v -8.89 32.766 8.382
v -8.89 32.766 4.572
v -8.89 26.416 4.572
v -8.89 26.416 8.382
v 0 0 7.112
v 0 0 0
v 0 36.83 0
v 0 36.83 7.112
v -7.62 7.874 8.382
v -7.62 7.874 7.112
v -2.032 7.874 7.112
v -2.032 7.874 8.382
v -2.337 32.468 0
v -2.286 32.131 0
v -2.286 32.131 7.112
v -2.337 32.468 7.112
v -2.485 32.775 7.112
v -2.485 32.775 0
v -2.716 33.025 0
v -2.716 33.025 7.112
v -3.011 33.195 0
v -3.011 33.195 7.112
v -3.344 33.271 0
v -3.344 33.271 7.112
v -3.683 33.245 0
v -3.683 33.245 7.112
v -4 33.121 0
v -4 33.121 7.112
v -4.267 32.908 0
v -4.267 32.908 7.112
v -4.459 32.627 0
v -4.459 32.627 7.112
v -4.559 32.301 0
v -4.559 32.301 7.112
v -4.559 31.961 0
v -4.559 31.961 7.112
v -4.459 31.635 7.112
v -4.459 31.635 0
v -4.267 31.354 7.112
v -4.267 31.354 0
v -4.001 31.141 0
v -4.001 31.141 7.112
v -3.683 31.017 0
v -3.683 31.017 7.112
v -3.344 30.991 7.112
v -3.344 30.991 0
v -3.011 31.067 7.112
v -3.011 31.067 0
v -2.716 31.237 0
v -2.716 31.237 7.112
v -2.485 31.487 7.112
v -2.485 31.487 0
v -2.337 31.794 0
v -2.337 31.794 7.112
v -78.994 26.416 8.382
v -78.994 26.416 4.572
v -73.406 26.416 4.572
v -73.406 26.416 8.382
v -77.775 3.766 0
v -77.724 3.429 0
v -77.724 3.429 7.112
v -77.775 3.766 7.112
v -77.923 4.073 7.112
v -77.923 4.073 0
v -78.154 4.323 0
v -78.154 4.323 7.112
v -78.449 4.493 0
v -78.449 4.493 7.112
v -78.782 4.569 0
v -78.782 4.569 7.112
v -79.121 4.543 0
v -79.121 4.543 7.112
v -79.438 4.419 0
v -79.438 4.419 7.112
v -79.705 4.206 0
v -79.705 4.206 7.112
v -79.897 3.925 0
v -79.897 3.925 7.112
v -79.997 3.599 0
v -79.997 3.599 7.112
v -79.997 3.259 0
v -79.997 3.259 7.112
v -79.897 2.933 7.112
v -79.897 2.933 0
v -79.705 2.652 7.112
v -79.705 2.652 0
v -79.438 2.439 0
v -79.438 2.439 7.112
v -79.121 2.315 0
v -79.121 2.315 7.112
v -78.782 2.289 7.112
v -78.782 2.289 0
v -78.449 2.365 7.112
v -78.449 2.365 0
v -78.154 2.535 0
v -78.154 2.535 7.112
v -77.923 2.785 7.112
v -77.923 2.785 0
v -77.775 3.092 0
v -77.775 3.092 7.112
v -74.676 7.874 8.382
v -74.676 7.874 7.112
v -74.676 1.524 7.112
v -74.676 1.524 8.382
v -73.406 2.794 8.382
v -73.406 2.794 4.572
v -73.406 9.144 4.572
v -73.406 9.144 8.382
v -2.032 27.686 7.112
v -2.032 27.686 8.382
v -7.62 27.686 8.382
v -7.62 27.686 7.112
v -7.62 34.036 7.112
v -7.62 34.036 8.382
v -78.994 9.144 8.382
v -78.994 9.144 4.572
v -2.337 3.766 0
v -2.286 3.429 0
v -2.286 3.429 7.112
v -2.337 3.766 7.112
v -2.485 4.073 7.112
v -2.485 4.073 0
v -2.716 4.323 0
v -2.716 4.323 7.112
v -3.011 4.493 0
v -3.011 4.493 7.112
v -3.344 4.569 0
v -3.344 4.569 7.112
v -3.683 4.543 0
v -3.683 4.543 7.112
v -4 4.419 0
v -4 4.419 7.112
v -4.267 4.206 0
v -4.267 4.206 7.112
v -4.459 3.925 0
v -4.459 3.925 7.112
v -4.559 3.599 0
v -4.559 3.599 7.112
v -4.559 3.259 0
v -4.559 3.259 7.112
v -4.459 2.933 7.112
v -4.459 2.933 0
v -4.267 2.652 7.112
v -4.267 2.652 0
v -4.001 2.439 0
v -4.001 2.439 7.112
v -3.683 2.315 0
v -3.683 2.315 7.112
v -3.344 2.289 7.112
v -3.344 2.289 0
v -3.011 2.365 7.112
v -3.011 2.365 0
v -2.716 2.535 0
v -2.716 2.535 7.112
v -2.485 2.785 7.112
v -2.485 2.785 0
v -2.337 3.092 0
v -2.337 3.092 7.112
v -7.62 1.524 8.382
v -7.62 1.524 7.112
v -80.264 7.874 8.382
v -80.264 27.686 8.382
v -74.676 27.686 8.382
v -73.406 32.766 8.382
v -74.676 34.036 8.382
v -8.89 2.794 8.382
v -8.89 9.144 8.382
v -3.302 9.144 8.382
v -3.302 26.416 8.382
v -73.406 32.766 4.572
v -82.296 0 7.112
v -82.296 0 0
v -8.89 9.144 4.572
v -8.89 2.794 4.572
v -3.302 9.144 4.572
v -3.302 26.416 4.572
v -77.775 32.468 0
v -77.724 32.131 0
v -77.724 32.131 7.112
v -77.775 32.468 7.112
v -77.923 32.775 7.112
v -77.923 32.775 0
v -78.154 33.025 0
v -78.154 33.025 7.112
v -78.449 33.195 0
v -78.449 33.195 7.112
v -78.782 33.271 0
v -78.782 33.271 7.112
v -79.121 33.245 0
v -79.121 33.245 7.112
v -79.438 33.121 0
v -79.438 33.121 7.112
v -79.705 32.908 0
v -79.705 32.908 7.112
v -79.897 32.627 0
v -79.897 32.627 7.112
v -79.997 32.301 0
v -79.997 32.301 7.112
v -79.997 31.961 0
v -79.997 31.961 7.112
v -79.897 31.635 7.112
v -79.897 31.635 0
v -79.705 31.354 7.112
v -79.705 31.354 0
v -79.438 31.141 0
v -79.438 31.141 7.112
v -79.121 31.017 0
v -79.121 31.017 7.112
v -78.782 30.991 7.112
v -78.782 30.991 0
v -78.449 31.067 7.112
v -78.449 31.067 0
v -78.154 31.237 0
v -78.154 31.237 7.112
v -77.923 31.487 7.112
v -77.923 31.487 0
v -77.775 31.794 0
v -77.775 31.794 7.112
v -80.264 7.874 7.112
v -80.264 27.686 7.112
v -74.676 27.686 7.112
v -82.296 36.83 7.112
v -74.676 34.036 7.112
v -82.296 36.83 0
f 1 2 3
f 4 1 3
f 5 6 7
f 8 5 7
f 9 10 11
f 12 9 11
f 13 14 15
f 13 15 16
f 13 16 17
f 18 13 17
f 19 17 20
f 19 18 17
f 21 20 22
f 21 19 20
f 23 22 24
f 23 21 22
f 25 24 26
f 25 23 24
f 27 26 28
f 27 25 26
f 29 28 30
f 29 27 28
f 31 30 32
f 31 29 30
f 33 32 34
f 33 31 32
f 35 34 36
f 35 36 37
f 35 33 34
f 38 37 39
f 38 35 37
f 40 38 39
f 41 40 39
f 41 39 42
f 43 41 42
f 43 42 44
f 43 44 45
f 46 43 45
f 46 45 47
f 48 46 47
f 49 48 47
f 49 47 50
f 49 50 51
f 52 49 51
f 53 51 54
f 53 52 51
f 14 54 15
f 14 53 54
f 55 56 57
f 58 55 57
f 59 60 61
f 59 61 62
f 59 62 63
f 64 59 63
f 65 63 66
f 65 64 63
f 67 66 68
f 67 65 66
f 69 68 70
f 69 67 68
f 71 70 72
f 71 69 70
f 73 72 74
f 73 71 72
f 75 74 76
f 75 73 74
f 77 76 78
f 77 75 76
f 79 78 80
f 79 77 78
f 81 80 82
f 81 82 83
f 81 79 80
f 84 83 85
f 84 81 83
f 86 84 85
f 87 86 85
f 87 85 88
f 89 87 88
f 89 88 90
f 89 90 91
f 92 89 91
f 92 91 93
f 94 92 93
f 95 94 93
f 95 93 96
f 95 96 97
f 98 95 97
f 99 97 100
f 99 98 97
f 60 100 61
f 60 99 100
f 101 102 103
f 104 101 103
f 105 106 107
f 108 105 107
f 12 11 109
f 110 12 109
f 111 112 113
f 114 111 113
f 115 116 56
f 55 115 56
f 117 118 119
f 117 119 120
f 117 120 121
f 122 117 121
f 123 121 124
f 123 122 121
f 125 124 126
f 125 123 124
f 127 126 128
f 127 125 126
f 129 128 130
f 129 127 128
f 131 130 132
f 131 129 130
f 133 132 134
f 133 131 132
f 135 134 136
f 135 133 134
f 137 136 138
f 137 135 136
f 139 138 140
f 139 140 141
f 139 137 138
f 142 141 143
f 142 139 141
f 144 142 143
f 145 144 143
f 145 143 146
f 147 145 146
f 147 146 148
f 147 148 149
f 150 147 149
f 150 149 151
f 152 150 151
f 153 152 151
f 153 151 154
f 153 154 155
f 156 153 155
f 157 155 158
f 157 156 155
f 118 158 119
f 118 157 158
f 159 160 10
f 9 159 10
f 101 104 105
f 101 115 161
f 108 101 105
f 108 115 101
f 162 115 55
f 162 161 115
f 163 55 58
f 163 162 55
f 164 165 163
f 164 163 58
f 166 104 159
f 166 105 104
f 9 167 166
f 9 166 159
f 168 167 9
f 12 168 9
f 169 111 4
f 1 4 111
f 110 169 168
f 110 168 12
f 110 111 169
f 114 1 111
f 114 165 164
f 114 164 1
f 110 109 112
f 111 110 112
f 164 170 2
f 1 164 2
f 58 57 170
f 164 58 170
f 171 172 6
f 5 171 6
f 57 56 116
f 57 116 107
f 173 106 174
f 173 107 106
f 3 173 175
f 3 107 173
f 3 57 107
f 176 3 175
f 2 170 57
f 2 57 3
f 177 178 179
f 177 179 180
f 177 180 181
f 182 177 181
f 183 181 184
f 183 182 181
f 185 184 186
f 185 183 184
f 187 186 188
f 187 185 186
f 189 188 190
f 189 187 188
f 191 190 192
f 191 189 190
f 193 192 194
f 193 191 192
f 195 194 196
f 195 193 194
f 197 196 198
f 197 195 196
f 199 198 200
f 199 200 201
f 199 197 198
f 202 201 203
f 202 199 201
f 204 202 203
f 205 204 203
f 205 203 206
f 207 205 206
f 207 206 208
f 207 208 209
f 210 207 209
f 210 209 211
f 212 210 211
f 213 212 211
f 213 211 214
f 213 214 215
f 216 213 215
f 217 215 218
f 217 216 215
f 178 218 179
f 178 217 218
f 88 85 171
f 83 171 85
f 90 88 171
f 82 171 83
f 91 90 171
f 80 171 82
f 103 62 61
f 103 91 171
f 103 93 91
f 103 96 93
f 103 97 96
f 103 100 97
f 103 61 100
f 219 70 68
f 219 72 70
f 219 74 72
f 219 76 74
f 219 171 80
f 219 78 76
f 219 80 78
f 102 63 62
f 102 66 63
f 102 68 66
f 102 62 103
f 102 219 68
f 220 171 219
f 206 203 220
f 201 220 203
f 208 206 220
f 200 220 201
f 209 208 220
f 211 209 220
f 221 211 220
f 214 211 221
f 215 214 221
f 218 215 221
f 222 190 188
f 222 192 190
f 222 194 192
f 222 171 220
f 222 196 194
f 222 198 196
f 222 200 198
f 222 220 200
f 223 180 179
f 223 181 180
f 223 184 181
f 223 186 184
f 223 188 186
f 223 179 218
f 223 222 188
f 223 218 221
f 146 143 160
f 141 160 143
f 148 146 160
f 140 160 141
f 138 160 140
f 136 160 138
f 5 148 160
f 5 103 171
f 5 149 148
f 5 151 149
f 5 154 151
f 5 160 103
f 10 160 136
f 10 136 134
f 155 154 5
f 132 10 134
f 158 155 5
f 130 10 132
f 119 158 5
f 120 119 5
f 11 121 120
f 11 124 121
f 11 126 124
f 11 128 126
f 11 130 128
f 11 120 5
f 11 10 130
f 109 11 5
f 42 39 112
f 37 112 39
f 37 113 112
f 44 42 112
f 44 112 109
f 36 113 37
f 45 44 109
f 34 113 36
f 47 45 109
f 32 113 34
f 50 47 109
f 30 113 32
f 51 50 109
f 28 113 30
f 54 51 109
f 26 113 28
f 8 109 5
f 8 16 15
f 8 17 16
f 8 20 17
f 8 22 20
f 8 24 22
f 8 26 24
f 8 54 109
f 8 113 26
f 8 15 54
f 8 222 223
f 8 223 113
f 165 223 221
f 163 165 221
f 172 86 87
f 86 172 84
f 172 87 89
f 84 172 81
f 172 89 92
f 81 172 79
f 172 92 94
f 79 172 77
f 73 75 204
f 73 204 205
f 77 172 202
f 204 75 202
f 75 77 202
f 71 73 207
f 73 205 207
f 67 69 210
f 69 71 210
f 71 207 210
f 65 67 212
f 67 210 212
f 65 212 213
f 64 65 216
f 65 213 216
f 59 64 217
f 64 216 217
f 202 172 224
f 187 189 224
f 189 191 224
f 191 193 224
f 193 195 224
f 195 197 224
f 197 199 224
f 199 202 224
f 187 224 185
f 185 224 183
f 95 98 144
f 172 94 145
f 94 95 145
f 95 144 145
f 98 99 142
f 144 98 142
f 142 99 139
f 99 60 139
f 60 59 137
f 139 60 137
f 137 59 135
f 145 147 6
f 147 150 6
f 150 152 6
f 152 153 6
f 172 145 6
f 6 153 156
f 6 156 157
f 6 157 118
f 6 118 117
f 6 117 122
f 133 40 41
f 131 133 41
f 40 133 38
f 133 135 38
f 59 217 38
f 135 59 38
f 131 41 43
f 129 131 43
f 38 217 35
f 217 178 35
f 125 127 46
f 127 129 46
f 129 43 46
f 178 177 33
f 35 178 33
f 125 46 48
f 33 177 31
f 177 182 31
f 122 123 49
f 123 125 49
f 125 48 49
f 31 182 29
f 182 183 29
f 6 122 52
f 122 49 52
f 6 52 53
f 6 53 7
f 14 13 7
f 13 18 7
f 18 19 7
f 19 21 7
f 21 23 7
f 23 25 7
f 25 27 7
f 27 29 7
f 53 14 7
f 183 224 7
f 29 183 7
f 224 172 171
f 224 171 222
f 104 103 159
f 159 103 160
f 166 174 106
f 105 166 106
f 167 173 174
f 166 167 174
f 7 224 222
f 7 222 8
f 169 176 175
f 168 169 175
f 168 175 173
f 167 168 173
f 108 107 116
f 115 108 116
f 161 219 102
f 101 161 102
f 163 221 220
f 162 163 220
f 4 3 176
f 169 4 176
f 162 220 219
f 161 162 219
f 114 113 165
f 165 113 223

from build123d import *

# Parameters (mm, degrees)
F0_W     = 82.296
F0_H     = 36.83
F0_R     = 1.143
F1_DEPTH = 7.112
F2_DEPTH = 8.382
F3_DEPTH = 4.572


with BuildPart() as f1:
    # F0 (on Top) → F1 (new body)
    with BuildSketch(Plane.XY):
        with Locations((-41.148, 18.415)):
            Rectangle(F0_W, F0_H)
        with Locations((-78.867, 3.429)):
            Circle(F0_R, mode=Mode.SUBTRACT)
        with Locations((-3.429, 3.429)):
            Circle(F0_R, mode=Mode.SUBTRACT)
        Polygon((-7.62, 7.874), (-7.62, 1.524), (-74.676, 1.524), (-74.676, 7.874), (-80.264, 7.874), (-80.264, 27.686), (-74.676, 27.686), (-74.676, 34.036), (-7.62, 34.036), (-7.62, 27.686), (-2.032, 27.686), (-2.032, 7.874), align=None, mode=Mode.SUBTRACT)
        with Locations((-78.867, 32.131)):
            Circle(F0_R, mode=Mode.SUBTRACT)
        with Locations((-3.429, 32.131)):
            Circle(F0_R, mode=Mode.SUBTRACT)
    extrude(amount=F1_DEPTH)

    # F0 (on Top) → F2 (join)
    with BuildSketch(Plane.XY):
        Polygon((-74.676, 1.524), (-7.62, 1.524), (-7.62, 7.874), (-2.032, 7.874), (-2.032, 27.686), (-7.62, 27.686), (-7.62, 34.036), (-74.676, 34.036), (-74.676, 27.686), (-80.264, 27.686), (-80.264, 7.874), (-74.676, 7.874), align=None)
        Polygon((-8.89, 9.144), (-8.89, 2.794), (-73.406, 2.794), (-73.406, 9.144), (-78.994, 9.144), (-78.994, 26.416), (-73.406, 26.416), (-73.406, 32.766), (-8.89, 32.766), (-8.89, 26.416), (-3.302, 26.416), (-3.302, 9.144), align=None, mode=Mode.SUBTRACT)
    extrude(amount=F2_DEPTH)

    # F0 (on Top) → F3 (join)
    with BuildSketch(Plane.XY):
        Polygon((-73.406, 2.794), (-8.89, 2.794), (-8.89, 9.144), (-3.302, 9.144), (-3.302, 26.416), (-8.89, 26.416), (-8.89, 32.766), (-73.406, 32.766), (-73.406, 26.416), (-78.994, 26.416), (-78.994, 9.144), (-73.406, 9.144), align=None)
    extrude(amount=F3_DEPTH)


solid = f1.part
